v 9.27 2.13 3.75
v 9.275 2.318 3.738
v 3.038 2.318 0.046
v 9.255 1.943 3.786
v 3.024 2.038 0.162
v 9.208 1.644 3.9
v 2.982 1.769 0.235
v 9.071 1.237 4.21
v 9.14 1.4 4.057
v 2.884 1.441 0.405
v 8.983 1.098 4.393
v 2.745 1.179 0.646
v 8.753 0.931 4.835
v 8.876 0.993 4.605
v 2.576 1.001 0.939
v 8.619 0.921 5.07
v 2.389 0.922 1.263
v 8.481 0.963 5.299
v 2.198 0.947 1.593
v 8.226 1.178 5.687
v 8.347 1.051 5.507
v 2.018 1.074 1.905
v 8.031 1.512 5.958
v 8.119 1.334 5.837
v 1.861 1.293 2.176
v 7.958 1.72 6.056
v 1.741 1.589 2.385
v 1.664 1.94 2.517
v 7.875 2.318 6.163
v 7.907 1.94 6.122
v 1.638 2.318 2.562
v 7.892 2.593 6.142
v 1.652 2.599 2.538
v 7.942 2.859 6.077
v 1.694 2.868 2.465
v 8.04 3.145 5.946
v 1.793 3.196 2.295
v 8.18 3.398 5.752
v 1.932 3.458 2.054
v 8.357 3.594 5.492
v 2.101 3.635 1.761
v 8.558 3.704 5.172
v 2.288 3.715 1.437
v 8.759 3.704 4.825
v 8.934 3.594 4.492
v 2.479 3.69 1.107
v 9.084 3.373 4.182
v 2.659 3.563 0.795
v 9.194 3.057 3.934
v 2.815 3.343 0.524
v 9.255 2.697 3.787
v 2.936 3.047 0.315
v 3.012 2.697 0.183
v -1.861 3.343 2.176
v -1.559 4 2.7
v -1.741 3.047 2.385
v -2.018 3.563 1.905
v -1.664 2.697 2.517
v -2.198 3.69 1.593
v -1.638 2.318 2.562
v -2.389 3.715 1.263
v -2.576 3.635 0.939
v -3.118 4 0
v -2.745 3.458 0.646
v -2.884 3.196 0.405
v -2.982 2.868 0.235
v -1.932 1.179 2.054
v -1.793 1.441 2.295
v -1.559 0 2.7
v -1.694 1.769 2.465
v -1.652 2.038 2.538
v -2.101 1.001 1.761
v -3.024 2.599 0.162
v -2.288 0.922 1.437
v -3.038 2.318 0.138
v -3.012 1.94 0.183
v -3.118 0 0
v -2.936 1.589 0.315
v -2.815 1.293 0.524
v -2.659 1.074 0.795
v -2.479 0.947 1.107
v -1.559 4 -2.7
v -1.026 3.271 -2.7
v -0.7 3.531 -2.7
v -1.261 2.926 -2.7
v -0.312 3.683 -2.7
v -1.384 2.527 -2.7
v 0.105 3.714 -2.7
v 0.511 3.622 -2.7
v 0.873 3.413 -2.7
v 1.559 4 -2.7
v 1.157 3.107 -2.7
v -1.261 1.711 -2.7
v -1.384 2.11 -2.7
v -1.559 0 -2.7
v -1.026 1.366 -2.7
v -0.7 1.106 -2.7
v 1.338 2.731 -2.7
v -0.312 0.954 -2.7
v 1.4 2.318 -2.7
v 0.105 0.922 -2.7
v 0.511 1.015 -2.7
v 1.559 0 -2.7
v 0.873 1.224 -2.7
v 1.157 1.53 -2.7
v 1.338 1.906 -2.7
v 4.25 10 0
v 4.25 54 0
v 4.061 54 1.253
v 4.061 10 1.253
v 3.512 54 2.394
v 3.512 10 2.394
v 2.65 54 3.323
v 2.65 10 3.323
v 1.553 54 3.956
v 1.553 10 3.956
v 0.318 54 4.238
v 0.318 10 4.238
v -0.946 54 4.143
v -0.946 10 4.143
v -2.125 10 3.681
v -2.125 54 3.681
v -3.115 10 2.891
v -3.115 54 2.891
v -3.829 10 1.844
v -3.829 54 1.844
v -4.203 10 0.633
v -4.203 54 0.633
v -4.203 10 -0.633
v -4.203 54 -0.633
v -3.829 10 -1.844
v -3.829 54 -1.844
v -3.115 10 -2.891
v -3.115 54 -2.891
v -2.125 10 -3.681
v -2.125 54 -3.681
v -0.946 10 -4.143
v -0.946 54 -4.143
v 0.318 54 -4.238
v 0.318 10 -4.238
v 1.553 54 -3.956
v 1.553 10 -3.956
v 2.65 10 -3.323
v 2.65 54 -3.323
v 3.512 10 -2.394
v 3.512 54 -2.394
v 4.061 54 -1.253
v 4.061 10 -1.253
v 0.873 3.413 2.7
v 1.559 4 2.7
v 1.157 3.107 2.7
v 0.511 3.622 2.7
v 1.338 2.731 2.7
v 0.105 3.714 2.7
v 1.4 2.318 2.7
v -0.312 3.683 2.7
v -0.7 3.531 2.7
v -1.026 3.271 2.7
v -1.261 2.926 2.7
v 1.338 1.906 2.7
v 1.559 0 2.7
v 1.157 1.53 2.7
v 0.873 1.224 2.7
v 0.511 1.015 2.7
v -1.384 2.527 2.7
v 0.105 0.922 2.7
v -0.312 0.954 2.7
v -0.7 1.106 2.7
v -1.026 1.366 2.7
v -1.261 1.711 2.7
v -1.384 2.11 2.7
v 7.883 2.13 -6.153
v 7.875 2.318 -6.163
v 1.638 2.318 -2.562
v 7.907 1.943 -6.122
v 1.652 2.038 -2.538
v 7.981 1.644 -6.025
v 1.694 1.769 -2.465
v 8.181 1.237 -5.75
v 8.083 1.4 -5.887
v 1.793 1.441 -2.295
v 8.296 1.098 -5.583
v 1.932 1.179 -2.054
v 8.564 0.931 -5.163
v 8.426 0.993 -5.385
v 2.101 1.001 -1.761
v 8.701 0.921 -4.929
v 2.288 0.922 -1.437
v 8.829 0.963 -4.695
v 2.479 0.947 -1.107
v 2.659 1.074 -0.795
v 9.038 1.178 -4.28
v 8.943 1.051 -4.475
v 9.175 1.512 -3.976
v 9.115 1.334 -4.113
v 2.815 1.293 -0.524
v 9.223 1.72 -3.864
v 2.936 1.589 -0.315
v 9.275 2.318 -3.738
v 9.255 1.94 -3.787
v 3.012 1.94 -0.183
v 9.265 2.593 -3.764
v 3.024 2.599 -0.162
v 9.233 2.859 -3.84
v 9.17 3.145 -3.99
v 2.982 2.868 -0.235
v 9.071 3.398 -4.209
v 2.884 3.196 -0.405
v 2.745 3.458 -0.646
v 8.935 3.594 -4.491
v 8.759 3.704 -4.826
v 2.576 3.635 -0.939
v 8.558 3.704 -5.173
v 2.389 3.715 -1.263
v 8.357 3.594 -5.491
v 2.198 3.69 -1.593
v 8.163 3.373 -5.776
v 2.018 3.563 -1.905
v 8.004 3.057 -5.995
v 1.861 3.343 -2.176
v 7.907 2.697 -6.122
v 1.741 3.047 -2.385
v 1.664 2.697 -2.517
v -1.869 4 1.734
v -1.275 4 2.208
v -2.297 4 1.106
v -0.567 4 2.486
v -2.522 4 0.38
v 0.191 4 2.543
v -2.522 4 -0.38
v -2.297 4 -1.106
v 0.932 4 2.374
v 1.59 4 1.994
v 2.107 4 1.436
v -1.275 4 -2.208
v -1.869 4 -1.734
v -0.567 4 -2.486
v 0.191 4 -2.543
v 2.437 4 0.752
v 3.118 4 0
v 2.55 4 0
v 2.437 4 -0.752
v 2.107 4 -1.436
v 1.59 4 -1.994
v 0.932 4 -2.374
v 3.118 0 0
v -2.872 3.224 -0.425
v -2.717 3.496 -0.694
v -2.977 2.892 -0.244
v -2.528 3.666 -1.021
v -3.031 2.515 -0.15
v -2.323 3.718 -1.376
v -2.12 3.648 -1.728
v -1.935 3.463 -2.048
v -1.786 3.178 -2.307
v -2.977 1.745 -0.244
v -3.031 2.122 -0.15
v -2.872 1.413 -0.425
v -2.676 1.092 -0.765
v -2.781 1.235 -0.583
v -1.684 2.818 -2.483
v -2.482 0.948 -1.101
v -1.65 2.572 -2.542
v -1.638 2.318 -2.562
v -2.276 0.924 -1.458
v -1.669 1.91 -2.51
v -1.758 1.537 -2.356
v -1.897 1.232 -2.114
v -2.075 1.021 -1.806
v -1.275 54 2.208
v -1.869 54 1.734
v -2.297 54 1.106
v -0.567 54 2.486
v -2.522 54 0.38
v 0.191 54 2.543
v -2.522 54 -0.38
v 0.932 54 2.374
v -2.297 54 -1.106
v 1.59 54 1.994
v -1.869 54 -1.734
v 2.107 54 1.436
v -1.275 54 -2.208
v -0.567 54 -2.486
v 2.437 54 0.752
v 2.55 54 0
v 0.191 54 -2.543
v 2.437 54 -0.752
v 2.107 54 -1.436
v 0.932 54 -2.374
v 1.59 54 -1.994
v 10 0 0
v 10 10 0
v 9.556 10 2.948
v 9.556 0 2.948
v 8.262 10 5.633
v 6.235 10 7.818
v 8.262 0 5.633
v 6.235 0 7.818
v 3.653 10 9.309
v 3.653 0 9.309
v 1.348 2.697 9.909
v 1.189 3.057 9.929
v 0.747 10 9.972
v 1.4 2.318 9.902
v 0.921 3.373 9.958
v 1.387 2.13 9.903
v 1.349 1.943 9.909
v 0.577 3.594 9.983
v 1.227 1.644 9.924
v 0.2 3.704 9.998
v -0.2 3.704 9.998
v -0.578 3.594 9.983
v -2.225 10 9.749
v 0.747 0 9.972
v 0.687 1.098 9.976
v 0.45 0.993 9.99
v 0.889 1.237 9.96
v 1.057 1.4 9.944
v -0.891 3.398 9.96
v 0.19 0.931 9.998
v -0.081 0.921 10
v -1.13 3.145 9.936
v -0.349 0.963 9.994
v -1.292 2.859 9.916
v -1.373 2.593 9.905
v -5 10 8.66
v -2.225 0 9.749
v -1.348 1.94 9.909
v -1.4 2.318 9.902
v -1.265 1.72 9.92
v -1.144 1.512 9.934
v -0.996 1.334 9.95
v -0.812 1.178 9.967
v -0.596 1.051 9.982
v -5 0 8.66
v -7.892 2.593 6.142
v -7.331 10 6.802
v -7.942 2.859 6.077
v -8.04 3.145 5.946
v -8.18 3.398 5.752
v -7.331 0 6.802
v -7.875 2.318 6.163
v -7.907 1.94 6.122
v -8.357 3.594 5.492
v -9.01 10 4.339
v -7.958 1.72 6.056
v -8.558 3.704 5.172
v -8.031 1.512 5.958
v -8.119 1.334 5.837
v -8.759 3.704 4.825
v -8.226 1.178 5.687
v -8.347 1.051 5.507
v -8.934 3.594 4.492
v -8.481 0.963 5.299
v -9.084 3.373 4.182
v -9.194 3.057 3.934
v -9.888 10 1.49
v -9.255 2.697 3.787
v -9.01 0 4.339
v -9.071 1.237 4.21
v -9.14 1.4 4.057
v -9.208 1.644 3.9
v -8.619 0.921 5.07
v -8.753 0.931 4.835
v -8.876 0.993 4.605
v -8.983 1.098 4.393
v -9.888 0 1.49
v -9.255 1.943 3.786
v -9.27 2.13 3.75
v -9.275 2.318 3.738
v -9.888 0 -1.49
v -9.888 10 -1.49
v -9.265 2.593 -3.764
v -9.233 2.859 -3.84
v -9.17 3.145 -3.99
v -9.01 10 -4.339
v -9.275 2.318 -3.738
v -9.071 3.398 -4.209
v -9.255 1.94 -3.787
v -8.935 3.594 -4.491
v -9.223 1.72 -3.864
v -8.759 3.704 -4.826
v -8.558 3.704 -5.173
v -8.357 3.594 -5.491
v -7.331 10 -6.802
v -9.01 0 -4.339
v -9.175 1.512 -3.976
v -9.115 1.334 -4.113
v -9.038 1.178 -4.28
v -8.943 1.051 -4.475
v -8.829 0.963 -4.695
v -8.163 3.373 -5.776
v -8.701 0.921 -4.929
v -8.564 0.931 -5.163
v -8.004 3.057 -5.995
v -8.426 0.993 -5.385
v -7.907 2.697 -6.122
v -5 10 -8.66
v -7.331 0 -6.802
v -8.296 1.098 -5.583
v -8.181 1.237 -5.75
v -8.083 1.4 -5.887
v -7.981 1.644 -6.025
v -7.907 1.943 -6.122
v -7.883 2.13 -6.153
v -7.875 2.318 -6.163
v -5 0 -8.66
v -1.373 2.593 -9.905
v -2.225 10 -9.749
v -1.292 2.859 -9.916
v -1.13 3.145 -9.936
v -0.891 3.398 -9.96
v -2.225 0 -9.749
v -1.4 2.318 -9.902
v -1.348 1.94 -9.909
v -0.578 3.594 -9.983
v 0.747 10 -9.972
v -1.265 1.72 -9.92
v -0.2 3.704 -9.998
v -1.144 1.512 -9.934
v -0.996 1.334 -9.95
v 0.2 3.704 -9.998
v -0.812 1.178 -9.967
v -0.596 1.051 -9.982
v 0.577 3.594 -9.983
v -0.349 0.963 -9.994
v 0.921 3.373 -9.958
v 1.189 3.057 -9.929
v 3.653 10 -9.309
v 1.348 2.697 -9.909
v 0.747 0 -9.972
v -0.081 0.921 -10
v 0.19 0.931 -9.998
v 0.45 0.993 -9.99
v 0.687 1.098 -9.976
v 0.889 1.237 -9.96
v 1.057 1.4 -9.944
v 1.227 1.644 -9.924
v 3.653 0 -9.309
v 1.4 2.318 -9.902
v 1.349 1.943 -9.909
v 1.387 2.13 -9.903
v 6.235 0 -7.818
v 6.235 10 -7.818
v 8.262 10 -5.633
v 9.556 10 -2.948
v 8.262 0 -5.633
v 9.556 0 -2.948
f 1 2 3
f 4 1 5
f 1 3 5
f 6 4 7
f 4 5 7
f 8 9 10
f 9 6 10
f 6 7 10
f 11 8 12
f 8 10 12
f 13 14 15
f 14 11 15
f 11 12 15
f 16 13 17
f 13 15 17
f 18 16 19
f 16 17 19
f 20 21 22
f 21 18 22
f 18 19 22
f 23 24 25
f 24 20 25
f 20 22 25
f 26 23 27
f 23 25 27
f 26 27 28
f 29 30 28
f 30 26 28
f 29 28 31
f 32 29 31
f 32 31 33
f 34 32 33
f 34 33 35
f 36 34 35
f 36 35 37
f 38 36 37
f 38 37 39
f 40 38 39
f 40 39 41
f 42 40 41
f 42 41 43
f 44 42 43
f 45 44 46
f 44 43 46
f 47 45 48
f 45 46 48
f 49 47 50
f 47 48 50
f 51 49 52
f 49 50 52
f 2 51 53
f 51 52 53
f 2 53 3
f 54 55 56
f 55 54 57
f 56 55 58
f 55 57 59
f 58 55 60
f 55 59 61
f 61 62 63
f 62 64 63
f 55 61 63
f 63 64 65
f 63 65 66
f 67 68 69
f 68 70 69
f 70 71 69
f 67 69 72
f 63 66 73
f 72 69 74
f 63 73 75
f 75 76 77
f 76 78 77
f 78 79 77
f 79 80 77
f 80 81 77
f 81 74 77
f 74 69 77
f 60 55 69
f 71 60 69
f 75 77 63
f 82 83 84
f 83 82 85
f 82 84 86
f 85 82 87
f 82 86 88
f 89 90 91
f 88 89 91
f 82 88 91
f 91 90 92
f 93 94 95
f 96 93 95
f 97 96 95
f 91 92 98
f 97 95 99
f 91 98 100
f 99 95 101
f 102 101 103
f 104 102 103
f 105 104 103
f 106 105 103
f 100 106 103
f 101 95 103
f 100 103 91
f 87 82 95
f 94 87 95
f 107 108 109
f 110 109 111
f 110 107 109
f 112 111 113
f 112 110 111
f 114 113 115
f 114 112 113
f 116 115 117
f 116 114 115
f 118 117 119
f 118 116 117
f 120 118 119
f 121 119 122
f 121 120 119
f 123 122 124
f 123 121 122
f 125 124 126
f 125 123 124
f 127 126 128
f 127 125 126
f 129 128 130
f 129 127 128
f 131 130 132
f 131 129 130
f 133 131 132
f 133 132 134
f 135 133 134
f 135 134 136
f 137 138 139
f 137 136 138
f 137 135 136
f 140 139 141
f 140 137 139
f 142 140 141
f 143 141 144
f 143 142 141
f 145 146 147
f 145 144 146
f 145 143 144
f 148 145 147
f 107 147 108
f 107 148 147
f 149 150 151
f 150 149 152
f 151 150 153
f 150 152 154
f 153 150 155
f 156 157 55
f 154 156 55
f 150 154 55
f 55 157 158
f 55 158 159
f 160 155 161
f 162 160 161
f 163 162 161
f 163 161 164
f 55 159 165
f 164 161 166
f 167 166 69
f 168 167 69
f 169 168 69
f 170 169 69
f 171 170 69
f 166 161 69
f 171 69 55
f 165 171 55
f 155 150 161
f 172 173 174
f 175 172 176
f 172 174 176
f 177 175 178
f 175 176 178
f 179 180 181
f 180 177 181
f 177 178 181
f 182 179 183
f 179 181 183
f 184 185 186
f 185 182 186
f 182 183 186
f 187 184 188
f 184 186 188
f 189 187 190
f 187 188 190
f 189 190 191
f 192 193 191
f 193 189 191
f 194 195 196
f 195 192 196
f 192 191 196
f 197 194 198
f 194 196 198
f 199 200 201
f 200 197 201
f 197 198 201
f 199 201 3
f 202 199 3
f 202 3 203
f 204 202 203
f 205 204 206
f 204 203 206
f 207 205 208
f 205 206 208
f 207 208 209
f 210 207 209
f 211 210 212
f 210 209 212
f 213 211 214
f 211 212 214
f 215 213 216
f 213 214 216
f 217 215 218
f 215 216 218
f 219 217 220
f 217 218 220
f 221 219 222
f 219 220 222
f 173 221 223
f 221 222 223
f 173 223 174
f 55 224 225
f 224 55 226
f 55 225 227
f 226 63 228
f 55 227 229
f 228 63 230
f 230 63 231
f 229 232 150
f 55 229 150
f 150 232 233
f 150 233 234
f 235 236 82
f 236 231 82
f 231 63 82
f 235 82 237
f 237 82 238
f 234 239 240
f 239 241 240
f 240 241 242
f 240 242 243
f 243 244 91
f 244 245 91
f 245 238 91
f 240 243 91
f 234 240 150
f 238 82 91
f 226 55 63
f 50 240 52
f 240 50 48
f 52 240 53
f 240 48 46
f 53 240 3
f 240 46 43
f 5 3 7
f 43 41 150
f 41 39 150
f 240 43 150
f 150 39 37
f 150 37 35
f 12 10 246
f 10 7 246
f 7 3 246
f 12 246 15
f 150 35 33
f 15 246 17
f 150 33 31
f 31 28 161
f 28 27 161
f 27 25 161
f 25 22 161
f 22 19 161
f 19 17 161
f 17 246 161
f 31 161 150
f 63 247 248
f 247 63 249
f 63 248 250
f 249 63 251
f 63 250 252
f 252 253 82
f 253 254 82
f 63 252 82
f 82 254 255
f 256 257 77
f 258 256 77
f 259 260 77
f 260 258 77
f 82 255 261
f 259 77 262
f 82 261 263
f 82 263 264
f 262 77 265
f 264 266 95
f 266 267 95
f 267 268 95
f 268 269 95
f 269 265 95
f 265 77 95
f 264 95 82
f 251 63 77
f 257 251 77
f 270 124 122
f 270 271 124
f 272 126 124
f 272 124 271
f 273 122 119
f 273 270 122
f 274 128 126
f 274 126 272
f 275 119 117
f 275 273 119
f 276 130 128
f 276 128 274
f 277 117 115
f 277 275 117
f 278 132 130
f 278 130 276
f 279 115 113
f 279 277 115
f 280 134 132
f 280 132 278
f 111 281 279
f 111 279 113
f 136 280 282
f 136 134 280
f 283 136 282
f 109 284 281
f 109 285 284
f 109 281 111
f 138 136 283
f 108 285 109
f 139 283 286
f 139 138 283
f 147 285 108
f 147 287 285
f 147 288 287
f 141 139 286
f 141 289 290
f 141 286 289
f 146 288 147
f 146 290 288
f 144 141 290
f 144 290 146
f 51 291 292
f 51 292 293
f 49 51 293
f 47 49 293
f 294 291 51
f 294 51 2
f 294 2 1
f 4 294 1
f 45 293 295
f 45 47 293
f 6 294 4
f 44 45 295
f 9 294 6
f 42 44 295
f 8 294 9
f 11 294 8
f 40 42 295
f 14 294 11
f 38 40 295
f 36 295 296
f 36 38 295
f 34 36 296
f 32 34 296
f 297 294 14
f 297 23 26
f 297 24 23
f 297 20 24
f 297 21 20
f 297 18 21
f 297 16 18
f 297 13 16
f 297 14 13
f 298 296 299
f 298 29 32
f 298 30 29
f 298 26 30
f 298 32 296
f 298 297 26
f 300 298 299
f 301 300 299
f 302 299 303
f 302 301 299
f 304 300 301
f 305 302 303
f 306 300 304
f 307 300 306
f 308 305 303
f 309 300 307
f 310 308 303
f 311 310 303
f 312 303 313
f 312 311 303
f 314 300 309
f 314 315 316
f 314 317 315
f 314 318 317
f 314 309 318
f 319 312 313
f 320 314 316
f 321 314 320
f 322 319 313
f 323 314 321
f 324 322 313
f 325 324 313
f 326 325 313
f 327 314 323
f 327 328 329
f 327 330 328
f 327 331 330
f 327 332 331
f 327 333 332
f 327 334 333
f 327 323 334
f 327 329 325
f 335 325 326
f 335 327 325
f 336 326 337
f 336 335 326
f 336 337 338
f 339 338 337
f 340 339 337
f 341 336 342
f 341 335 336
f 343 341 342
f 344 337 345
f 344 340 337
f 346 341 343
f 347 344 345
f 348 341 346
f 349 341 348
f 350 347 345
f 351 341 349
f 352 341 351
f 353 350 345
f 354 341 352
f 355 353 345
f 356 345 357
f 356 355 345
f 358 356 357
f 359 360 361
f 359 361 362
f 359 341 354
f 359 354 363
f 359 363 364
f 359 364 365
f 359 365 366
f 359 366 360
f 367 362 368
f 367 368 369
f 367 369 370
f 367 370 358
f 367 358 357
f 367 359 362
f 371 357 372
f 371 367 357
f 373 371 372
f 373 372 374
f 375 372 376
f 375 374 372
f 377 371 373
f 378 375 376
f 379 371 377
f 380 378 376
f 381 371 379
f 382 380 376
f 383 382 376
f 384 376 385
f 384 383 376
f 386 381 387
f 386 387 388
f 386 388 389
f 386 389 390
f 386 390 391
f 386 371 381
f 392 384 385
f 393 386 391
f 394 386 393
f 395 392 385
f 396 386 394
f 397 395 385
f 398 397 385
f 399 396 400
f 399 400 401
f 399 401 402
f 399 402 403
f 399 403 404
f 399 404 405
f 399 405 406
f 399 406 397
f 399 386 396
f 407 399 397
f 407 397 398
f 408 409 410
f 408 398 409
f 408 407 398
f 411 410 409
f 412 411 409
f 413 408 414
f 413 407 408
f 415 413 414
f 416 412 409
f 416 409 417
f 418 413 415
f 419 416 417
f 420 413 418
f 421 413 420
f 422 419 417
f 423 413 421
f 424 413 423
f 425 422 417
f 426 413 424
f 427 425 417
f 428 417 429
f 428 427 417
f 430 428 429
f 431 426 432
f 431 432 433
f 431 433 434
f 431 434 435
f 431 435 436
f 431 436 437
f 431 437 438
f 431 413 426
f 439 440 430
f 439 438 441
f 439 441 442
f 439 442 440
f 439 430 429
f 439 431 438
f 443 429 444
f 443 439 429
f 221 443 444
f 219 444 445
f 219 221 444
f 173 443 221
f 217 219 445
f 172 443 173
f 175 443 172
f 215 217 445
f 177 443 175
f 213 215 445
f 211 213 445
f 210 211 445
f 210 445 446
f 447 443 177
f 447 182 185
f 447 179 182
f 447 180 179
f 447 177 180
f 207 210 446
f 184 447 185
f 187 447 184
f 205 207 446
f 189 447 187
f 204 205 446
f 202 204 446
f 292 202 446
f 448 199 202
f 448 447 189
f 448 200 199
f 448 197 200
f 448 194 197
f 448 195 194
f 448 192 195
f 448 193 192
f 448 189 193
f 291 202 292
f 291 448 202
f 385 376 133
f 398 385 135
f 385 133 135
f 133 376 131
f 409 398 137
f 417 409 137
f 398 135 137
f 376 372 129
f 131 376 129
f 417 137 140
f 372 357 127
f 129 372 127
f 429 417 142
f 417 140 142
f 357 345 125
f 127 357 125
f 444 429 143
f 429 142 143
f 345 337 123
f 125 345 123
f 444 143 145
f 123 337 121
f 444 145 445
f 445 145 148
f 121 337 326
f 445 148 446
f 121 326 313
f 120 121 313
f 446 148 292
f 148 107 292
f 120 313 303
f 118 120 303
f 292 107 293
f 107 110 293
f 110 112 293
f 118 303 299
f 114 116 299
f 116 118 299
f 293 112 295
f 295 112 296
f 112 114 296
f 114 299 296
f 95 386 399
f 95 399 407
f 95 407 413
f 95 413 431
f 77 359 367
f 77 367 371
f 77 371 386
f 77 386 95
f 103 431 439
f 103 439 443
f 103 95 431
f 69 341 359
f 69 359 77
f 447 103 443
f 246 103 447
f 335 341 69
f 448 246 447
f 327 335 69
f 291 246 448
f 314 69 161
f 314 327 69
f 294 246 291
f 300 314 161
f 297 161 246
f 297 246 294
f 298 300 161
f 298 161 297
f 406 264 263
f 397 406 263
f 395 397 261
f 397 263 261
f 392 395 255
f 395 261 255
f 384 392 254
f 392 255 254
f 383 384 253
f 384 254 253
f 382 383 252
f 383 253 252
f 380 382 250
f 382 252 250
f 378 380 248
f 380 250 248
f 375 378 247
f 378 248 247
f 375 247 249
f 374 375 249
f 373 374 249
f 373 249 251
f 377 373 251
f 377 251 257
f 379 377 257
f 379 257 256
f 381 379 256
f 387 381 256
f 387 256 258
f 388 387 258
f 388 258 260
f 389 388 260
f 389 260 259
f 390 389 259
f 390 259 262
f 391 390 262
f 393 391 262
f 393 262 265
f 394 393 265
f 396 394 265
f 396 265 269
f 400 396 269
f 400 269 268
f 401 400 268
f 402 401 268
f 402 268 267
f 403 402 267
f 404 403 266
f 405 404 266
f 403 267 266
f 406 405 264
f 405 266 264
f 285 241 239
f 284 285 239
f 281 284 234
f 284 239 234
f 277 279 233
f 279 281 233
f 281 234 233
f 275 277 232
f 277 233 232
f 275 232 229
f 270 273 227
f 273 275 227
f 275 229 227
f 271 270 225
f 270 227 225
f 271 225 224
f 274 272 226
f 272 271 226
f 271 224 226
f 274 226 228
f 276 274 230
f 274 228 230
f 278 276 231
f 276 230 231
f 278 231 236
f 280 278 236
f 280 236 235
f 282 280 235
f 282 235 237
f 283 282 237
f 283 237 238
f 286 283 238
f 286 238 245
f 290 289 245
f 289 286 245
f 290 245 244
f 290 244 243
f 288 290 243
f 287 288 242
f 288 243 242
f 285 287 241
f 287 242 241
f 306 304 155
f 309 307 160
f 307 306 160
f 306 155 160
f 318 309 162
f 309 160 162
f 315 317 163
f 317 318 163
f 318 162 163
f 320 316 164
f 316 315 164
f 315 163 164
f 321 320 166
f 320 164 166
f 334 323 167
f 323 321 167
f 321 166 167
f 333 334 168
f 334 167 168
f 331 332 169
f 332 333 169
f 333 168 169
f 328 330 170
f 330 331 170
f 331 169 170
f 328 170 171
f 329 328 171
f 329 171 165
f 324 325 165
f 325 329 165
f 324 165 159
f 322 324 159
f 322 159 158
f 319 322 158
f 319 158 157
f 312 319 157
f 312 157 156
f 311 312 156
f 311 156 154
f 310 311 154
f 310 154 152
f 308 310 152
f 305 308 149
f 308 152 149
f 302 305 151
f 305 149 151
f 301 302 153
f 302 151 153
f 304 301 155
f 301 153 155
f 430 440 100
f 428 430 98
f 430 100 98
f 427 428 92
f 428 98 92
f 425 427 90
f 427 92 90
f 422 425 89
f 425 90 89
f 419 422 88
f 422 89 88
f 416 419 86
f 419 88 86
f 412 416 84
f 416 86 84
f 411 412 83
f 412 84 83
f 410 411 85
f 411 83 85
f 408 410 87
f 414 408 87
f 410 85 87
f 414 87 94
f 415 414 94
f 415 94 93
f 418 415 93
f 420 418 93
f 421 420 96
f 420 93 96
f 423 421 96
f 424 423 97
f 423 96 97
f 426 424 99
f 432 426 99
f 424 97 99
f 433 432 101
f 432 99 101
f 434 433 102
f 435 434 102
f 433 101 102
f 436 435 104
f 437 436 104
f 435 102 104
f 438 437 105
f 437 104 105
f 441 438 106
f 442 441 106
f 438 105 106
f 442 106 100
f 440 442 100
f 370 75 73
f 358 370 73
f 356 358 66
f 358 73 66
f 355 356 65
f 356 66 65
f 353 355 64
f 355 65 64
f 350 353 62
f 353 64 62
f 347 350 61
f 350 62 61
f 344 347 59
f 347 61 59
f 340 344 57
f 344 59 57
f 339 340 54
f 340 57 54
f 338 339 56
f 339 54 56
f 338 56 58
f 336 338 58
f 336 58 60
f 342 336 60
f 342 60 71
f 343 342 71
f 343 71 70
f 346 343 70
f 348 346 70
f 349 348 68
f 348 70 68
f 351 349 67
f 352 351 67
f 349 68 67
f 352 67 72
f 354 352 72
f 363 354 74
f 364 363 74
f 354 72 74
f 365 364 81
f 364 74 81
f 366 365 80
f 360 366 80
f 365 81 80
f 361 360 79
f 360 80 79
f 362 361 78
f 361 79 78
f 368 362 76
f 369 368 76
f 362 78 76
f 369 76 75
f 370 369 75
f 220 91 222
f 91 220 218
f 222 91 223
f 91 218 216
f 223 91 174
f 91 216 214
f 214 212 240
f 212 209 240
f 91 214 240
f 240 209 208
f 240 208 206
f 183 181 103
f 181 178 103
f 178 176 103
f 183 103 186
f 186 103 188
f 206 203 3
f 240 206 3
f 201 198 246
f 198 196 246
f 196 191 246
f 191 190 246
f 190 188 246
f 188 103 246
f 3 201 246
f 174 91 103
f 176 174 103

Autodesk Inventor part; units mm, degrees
ref_plane "YZ Plane" through (0, 0, 0) normal (1, 0, 0) x (0, 1, 0)
ref_plane "XZ Plane" through (0, 0, 0) normal (0, 1, 0) x (-1, 0, 0)
ref_plane "XY Plane" through (0, 0, 0) normal (0, 0, 1) x (1, 0, 0)
sketch "Sketch8" plane through (0, 0, 0) normal (0, 1, 0) x (-1, 0, 0)
  circle A0 centre (0, 0) radius 4.25
  line L0 (-1.5588, -2.7) -> (-3.1177, 0)
  line L1 (-3.1177, 0) -> (-1.5588, 2.7)
  line L2 (-1.5588, 2.7) -> (1.5588, 2.7)
  line L3 (1.5588, 2.7) -> (3.1177, 0)
  line L4 (3.1177, 0) -> (1.5588, -2.7)
  line L5 (1.5588, -2.7) -> (-1.5588, -2.7)
  line L6 (-5.95, 0) -> (5.95, 0) projected
  dimension "d57" = 8.5
  dimension "d58" = 5.4
extrude "Extrusion7" add sketch "Sketch8" along normal blind 4 contours L6 L3 L2 L1 A0 | A0 L6 L0 L5 L4
sketch "Sketch9" plane through (0, 4, 0) normal (0, 1, 0) x (1, 0, 0)
  circle A0 centre (0, 0) radius 4.25 projected
  line L0 (-3.1177, 0) -> (-1.5588, 2.7) projected
  line L1 (-1.5588, 2.7) -> (1.5588, 2.7) projected
  line L2 (1.5588, 2.7) -> (3.1177, 0) projected
  line L3 (3.1177, 0) -> (1.5588, -2.7) projected
  line L4 (1.5588, -2.7) -> (-1.5588, -2.7) projected
  line L5 (-1.5588, -2.7) -> (-3.1177, 0) projected
  circle A1 centre (0, 0) radius 2.55
  dimension "d61" = 5.1
extrude "Extrusion8" add sketch "Sketch9" along normal blind 50 contours A0 | L0 L1 L2 L3 L4 L5
sketch "Sketch11" plane through (0, 0, 0) normal (0, -1, 0) x (1, 0, 0)
  circle A0 centre (0, 0) radius 4.25 projected
  circle A1 centre (0, 0) radius 10
  dimension "d71" = 20
extrude "Extrusion10" add sketch "Sketch11" against normal blind 10
sketch "Sketch12" plane through (-1.5588, 0, -2.7) normal (0, 0, 1) x (1, 0, 0)
  line L0 (0, 0) -> (0, 4) projected
  line L1 (4.6765, 0) -> (4.6765, 4) projected
  circle A0 centre (1.5588, 2.3184) radius 1.4
  point P0 (1.5588, 0)
  dimension "d74" = 2.8
extrude "Extrusion11" cut sketch "Sketch12" along normal through all both and the other way through all
pattern_circular "Circular Pattern5" count 6 over 360 about axis through (0, 0, 0) along (0, 1, 0) of "Extrusion11"
properties part number "30_Cube_Z_Focus_MGN_NEMA_Motorcoupling_Captive_v3"
